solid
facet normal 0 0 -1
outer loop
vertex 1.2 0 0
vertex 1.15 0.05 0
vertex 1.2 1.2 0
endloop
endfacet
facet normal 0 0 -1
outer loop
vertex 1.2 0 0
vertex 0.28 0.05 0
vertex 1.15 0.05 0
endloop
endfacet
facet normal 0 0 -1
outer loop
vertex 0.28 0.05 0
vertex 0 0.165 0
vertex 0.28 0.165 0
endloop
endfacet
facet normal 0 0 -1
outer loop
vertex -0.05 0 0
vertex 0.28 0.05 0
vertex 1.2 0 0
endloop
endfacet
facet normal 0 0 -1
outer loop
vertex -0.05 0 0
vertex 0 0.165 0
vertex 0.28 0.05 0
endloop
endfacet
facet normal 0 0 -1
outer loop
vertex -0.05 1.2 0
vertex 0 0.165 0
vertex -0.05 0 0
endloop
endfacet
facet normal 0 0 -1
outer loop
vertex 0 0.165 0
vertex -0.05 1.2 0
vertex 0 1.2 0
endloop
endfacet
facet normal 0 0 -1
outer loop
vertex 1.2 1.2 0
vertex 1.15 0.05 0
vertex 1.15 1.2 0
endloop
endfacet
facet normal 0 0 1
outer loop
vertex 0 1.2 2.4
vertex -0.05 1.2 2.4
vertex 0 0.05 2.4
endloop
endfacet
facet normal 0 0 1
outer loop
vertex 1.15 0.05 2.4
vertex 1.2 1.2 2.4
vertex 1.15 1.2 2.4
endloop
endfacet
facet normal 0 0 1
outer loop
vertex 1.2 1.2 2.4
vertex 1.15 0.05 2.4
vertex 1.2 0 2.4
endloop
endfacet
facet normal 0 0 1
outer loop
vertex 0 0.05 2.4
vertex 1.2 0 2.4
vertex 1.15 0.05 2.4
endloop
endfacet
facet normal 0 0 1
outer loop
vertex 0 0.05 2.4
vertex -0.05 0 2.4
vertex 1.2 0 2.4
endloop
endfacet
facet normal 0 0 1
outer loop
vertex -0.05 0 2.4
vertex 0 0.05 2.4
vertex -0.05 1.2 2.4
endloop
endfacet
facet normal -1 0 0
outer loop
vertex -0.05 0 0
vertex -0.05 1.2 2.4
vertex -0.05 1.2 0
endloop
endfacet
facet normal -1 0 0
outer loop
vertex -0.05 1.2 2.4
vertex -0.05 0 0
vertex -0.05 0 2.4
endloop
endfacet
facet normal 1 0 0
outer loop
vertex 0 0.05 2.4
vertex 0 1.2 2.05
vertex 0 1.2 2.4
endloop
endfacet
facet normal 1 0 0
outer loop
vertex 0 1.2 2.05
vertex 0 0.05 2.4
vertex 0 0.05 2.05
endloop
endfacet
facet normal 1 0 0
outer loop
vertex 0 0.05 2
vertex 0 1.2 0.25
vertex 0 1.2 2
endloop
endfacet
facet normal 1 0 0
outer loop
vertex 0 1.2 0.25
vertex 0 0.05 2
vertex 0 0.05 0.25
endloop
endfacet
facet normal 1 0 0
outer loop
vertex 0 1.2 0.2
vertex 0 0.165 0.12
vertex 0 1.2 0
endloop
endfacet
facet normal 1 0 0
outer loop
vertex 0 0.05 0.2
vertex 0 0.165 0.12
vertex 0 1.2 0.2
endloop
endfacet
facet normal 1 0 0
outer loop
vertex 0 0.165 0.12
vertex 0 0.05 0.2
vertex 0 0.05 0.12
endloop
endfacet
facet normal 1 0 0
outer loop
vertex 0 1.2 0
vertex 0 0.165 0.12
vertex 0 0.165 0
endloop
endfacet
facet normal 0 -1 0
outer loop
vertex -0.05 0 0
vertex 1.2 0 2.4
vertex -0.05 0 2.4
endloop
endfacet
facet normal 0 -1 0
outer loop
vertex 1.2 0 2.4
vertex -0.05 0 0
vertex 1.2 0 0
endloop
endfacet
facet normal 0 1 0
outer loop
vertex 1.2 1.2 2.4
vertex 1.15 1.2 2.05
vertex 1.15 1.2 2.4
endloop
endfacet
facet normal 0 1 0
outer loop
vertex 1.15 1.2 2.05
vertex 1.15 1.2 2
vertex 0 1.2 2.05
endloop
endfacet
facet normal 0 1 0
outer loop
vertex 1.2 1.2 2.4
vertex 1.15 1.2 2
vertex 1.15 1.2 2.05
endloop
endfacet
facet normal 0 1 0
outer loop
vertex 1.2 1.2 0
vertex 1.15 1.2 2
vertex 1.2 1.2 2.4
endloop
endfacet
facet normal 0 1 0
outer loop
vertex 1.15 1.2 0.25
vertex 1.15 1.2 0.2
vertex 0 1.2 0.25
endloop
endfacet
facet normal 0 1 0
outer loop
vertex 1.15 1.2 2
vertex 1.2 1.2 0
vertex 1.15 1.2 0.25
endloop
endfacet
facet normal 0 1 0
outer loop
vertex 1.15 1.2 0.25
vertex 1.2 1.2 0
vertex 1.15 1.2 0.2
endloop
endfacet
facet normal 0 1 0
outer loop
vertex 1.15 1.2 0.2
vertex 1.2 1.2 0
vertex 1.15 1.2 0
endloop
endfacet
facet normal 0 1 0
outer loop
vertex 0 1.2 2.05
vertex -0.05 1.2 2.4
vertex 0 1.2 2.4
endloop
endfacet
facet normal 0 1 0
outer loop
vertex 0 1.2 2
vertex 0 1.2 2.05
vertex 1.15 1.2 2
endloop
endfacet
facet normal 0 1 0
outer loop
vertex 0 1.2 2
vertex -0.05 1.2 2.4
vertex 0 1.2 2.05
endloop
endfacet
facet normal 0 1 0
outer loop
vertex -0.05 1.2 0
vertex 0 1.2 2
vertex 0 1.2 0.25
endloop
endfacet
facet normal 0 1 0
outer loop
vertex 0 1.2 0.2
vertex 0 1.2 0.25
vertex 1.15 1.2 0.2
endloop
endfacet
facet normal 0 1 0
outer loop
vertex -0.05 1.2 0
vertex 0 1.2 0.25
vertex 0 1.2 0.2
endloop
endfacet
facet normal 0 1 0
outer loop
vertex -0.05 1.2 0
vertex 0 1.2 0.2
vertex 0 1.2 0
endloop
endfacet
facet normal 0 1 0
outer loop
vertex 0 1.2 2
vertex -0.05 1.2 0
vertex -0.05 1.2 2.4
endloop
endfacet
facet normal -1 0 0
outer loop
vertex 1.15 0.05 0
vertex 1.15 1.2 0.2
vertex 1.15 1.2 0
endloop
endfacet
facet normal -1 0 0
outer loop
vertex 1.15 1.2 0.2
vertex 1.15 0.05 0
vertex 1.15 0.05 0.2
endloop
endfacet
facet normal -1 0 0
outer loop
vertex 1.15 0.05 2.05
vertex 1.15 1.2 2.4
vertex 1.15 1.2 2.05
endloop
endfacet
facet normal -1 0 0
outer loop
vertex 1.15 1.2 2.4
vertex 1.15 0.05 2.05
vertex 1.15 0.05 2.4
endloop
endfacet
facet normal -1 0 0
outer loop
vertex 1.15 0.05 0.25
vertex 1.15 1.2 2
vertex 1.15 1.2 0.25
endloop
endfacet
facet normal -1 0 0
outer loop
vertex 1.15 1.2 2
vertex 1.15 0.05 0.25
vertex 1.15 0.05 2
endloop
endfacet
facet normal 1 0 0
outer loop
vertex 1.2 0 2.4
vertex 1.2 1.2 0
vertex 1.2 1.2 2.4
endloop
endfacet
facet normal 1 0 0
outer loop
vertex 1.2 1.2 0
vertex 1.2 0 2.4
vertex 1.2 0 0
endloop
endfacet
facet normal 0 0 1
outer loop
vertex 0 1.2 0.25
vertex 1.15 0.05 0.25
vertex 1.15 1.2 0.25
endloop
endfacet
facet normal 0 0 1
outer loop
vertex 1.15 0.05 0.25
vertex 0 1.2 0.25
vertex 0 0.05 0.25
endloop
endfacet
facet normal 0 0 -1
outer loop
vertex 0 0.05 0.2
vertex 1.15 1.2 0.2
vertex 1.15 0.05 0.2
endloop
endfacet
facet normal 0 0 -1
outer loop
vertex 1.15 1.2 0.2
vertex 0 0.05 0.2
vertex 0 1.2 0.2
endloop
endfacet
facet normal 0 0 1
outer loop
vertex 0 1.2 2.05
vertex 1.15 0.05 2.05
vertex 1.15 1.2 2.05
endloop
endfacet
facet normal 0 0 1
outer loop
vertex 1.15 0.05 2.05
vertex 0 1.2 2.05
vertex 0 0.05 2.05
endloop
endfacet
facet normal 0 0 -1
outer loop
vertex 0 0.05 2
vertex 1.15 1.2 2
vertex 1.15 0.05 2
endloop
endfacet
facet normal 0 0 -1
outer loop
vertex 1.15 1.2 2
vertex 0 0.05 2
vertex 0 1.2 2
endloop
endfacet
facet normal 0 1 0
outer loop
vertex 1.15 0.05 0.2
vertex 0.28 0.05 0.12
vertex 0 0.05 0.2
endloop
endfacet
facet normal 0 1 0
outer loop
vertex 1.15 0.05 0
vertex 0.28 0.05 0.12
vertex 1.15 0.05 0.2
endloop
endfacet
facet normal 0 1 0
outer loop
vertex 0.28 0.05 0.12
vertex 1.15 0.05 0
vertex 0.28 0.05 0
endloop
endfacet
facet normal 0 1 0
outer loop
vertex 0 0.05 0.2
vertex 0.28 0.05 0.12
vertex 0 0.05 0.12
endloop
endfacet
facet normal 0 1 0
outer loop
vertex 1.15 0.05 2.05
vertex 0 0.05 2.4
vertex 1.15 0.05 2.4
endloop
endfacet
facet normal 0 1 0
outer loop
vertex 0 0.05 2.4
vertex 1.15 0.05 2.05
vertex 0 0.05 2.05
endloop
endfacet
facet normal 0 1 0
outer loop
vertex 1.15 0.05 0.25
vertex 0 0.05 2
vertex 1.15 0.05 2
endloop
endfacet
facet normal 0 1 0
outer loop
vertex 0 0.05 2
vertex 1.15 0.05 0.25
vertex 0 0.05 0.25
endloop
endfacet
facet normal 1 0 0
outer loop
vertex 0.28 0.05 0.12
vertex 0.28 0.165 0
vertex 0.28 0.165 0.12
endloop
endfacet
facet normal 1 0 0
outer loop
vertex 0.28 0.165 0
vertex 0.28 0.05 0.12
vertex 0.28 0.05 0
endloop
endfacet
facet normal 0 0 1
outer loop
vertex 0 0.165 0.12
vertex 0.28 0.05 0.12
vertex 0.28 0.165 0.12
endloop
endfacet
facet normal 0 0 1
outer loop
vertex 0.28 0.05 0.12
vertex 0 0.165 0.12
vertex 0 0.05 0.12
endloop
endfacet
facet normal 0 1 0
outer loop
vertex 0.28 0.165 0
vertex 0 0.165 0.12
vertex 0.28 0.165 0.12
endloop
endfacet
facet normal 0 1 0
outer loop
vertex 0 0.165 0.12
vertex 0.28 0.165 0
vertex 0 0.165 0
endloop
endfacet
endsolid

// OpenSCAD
rotate([0,-90,0]) cube([2.4,1.2,0.05]);
translate ([1.2,0,0]) rotate([0,-90,0]) cube([2.4,1.2,0.05]);
translate ([0,0,0.2])cube([1.2,1.2,0.05]);
translate ([0,0,2.0]) cube([1.2,1.2,0.05]);
translate ([1.2,0,2.4]) rotate([0,90,90]) cube([2.4,1.2,0.05]);


//psu
translate ([0,0.05,0]) color ("red") cube ([0.28,0.115,0.12]);
